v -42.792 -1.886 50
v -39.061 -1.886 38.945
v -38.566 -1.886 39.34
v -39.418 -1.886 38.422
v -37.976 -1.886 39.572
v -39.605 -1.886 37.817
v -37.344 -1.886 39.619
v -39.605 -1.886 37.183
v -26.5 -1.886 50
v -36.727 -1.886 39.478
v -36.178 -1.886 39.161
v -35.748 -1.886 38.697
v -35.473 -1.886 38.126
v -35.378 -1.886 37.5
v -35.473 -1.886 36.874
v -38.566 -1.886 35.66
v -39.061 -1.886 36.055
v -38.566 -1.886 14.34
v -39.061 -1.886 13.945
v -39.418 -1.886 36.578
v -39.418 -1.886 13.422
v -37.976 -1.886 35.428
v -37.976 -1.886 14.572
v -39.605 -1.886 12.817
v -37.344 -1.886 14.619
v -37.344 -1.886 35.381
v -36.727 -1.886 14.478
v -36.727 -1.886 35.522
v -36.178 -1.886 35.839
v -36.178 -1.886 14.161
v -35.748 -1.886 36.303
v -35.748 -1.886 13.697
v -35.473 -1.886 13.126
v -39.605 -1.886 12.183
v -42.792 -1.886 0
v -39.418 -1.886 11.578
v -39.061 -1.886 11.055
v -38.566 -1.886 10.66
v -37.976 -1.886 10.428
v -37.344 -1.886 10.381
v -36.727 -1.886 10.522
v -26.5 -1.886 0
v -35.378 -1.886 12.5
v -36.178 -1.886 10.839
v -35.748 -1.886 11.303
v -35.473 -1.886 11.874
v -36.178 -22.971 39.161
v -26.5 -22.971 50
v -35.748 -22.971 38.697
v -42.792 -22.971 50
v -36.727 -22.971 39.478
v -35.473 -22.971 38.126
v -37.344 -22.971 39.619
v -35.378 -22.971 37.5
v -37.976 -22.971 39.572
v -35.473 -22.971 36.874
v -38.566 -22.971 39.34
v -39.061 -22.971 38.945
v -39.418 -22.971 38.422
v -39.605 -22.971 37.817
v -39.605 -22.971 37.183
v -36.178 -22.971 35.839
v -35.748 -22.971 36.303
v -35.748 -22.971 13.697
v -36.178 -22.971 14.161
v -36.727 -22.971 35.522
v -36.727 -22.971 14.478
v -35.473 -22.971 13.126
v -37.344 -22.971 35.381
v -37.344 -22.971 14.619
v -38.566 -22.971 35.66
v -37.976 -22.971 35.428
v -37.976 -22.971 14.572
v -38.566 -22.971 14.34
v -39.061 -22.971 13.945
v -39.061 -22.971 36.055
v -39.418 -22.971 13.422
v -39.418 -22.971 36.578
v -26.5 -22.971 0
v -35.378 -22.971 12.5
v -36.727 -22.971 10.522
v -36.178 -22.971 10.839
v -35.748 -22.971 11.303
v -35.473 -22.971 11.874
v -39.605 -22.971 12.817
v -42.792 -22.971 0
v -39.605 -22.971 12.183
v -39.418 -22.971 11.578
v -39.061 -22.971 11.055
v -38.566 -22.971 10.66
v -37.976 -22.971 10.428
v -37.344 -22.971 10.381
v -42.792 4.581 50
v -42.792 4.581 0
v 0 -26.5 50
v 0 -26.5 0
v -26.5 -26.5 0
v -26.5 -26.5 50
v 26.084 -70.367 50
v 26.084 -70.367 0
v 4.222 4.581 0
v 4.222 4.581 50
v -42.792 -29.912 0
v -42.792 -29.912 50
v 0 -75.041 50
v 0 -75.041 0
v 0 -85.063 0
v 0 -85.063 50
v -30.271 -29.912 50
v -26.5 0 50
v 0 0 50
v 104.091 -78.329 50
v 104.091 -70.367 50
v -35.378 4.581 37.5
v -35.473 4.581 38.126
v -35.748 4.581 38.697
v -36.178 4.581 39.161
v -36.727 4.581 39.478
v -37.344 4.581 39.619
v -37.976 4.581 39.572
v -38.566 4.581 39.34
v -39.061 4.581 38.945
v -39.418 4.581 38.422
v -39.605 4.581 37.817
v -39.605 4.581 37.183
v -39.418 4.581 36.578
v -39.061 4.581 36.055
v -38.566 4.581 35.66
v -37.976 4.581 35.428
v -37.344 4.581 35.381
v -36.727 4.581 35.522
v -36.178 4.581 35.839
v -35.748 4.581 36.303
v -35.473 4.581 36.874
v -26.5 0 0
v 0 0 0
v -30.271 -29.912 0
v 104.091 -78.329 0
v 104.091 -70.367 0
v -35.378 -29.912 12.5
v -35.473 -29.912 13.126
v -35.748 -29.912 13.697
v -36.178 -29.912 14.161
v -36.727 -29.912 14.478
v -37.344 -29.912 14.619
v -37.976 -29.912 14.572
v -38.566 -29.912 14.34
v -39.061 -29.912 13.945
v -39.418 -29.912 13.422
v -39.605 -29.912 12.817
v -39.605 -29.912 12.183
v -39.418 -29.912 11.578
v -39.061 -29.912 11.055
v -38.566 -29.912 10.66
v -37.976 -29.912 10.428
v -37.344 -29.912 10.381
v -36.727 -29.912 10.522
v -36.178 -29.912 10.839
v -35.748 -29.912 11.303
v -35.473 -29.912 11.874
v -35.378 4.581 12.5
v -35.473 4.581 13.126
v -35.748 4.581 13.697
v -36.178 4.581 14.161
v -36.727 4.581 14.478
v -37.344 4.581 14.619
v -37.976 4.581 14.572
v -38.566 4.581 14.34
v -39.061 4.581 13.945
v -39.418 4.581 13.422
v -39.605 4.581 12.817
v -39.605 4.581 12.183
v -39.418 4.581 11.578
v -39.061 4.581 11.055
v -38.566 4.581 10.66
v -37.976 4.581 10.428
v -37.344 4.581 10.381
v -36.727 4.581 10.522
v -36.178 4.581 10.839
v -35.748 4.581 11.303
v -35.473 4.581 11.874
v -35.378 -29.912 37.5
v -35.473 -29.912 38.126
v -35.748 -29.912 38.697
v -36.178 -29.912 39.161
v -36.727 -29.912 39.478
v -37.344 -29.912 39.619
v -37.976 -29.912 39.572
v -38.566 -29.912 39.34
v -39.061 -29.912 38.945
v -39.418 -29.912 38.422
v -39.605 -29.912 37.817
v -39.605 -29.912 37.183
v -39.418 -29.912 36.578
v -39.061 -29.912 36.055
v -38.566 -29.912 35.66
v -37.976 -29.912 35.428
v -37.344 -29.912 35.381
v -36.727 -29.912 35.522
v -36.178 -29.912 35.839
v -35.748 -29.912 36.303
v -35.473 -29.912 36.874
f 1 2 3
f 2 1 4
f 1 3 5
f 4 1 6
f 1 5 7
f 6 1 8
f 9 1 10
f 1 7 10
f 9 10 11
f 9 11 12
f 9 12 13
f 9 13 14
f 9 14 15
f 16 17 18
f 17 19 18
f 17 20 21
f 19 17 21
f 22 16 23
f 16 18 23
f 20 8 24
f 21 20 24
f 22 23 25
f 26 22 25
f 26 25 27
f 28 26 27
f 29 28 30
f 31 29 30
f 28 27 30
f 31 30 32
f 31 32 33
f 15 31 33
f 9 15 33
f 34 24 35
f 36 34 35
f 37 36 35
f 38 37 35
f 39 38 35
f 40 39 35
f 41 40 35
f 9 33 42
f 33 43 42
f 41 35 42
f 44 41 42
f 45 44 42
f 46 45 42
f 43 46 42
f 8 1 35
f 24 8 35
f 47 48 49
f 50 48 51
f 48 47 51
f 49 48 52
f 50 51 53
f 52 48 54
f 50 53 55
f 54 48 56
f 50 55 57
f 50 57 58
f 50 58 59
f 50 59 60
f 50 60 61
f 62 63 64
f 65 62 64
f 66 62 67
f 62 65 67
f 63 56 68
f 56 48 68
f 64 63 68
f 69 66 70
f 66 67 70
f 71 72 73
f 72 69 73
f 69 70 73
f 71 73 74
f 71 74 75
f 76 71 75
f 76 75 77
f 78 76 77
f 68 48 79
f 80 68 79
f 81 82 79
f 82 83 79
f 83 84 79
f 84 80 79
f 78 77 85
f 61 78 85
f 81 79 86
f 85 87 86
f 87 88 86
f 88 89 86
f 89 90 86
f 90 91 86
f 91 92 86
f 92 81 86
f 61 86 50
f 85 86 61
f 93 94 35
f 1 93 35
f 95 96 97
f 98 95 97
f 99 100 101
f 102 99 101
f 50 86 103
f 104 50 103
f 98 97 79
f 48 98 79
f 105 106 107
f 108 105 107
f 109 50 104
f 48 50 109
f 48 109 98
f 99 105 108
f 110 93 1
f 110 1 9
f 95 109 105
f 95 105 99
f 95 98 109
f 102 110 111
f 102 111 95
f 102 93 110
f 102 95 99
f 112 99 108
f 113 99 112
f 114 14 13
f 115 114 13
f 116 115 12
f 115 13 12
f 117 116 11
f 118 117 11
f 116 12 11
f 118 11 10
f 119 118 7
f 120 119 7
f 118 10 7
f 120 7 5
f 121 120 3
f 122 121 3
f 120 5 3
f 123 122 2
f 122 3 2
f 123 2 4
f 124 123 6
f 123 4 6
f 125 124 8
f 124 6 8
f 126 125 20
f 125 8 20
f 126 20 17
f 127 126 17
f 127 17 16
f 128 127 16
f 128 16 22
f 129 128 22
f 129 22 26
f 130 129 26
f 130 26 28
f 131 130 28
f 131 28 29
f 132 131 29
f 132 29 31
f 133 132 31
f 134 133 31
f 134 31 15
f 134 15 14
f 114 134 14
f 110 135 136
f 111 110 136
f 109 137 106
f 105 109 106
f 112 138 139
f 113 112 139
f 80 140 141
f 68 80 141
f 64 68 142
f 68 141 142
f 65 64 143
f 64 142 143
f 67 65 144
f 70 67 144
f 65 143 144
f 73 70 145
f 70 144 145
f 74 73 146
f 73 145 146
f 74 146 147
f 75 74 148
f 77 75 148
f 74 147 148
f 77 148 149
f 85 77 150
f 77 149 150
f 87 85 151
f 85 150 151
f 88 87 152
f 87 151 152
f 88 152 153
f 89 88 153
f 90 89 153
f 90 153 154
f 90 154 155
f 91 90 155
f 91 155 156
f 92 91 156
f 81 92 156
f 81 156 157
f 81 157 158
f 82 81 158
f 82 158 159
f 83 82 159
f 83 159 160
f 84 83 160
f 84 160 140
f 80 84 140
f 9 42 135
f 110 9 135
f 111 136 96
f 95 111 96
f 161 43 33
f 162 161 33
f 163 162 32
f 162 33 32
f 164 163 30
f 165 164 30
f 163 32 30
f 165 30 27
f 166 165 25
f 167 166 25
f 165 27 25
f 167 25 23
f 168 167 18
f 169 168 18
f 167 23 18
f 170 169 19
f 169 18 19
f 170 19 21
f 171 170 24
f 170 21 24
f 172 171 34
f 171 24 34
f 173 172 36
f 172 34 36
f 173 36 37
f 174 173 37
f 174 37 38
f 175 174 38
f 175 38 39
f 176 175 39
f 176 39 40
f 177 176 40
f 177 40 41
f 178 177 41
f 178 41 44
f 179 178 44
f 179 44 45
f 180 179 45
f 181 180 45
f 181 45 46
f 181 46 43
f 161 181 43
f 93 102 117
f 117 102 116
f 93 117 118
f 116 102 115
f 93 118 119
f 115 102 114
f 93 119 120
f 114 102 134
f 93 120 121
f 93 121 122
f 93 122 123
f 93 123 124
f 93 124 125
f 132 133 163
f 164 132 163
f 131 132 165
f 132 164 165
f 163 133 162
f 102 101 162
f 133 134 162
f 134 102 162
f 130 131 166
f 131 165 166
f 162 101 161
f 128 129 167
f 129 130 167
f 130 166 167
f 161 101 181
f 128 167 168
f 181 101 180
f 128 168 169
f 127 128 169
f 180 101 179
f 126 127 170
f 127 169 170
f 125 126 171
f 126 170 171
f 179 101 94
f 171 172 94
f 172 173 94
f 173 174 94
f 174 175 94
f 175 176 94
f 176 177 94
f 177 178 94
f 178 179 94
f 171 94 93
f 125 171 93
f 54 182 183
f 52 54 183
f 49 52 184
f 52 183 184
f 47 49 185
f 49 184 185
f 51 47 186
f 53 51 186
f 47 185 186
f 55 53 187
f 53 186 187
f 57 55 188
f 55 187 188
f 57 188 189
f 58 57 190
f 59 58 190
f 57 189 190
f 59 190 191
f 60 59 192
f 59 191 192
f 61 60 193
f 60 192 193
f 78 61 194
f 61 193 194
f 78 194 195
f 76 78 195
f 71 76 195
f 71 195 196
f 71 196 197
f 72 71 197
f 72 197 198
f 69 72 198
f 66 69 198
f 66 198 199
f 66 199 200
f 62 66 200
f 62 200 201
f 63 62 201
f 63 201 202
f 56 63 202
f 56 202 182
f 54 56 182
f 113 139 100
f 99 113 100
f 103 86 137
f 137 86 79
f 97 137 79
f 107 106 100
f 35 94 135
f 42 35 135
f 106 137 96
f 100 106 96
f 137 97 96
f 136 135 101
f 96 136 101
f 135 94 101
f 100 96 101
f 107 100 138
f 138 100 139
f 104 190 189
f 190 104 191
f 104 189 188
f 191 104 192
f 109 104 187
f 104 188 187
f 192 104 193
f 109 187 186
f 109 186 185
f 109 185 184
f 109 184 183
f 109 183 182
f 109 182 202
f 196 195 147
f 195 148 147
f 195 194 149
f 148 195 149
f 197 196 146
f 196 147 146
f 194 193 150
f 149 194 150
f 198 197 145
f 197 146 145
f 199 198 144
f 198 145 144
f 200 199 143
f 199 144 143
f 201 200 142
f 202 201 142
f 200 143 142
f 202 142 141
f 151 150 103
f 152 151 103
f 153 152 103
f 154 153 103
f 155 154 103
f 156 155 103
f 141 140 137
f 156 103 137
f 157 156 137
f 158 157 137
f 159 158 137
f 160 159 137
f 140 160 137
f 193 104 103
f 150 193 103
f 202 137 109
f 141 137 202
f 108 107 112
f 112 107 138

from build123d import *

# Parameters (mm, degrees)
F1_DEPTH = 50
F3_D     = 4.25


# Not quite as in the source:
# - a feature names something its author has since deleted; it is built from what else it names


with BuildPart() as f1:
    # F0 (on Top) → F1 (new body)
    with BuildSketch(Plane.XY):
        Polygon((-30.2708722231, 4.5814236456), (-30.2708722231, 0), (-30.2708722231, -1.8863187066), (-26.5, -1.8863187066), (-26.5, 0), (0, 0), (0, -26.5), (-26.5, -26.5), (-26.5, -22.9706130922), (-30.2708722231, -22.9706130922), (-30.2708722231, -26.5), (-30.2708722231, -29.9115763544), (0, -29.9115763544), (4.2217531975, -29.9115763544), (4.2217531975, 0), (4.2217531975, 4.5814236456), align=None)
        Polygon((-30.2708722231, -1.8863187066), (-30.2708722231, 0), (-30.2708722231, 4.5814236456), (-42.7924469113, 4.5814236456), (-42.7924469113, -1.8863187066), align=None)
        Polygon((-42.7924469113, -29.9115763544), (-30.2708722231, -29.9115763544), (-30.2708722231, -26.5), (-30.2708722231, -22.9706130922), (-42.7924469113, -22.9706130922), align=None)
        Polygon((0, -75.0411301851), (0, -29.9115763544), (-30.2708722231, -29.9115763544), align=None)
        Polygon((104.0906682611, -70.3669339418), (26.0842684656, -70.3669339418), (4.2217531975, -70.3669339418), (4.2217531975, -29.9115763544), (0, -29.9115763544), (0, -75.0411301851), (0, -85.0630626082), (104.0906682611, -78.3288473744), (104.0906682611, -75.0411301851), align=None)
        Polygon((26.0842684656, -70.3669339418), (4.2217531975, 4.5814236456), (4.2217531975, 0), (4.2217531975, -29.9115763544), (4.2217531975, -70.3669339418), align=None)
    extrude(amount=F1_DEPTH)

    # F3 (through all)
    with Locations(Plane(origin=(0, 4.5814236456, 0), x_dir=(-1, 0, 0), z_dir=(0, 1, 0))):
        with Locations((37.5032611191, 37.5), (37.5032611191, 12.5)):
            Hole(F3_D / 2)


solid = f1.part
